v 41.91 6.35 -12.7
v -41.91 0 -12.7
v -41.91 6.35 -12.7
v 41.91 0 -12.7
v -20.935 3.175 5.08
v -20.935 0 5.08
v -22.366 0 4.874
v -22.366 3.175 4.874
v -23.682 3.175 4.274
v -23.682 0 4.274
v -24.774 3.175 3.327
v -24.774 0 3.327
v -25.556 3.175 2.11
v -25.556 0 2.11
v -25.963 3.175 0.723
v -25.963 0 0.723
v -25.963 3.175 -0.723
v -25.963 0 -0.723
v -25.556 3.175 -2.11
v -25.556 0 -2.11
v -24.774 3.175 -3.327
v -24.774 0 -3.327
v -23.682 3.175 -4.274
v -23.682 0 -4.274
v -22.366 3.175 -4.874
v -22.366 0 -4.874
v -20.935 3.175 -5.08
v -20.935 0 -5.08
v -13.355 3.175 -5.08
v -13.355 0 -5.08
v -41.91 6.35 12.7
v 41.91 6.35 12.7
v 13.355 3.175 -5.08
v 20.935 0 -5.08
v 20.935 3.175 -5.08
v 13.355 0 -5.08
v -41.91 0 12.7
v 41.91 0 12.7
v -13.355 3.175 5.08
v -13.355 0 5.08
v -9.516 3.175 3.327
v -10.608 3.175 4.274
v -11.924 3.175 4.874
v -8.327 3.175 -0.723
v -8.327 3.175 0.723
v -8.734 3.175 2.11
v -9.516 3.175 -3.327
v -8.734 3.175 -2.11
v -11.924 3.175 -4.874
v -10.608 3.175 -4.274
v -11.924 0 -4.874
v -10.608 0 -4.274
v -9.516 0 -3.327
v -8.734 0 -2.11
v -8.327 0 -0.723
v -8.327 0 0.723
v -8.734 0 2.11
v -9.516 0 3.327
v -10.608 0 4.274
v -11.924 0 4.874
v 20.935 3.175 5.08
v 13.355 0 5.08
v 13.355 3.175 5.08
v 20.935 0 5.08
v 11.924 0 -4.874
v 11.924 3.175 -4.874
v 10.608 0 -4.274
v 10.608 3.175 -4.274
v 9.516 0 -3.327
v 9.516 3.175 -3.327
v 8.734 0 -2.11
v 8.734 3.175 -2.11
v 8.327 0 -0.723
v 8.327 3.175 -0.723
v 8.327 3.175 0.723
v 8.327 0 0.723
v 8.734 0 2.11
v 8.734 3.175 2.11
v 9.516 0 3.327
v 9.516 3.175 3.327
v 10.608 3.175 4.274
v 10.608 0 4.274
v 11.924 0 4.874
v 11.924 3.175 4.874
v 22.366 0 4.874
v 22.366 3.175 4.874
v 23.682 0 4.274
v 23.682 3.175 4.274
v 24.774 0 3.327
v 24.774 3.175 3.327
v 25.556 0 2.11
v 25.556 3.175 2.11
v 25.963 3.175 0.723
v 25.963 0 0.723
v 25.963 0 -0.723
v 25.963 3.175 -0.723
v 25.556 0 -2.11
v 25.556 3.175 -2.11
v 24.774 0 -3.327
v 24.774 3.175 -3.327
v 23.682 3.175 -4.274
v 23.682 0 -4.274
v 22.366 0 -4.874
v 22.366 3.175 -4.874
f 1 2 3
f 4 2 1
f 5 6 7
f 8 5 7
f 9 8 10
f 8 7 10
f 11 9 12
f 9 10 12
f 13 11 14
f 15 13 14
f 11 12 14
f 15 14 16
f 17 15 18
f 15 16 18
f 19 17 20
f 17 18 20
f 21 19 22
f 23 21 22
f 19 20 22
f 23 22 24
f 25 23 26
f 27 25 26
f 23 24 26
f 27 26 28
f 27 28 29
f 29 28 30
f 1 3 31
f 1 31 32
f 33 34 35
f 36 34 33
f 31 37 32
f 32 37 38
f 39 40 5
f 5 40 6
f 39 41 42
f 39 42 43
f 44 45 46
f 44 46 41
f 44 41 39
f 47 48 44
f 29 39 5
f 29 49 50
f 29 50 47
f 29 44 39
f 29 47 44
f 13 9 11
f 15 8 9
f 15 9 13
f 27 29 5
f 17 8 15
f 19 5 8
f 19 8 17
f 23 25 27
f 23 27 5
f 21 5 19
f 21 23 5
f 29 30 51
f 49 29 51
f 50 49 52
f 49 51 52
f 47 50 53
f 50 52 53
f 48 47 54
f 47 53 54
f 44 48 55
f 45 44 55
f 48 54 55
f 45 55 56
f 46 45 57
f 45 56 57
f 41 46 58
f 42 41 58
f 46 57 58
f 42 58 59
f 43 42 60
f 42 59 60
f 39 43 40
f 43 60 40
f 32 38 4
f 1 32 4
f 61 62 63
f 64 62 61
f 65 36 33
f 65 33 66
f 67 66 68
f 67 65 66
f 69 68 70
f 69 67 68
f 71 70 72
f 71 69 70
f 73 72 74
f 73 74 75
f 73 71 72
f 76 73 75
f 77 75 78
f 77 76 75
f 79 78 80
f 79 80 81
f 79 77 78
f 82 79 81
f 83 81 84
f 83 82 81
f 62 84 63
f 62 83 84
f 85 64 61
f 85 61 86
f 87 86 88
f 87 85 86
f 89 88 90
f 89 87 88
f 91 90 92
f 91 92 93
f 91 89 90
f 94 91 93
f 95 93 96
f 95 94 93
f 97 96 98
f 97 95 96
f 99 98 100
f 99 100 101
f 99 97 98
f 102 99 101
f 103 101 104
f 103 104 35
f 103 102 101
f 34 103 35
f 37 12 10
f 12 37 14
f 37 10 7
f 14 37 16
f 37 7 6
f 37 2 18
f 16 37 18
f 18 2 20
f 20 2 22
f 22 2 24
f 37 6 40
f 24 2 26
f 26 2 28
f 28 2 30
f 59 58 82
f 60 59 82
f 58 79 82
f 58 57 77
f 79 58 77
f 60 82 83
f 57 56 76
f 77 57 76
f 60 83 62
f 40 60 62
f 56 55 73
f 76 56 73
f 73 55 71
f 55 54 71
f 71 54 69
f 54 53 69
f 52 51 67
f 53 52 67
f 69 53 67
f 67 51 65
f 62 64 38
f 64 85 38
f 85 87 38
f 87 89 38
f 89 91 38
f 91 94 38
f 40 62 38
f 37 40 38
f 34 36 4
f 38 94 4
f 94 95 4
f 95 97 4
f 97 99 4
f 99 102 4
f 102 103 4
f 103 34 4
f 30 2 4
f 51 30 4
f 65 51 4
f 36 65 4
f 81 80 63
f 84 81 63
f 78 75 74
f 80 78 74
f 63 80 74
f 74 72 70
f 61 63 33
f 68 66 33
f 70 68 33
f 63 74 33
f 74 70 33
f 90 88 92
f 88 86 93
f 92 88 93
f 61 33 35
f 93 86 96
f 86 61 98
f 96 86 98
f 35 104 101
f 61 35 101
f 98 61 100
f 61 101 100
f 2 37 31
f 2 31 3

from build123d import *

# Parameters (mm, degrees)
SKETCH1_W          = 83.82
SKETCH1_H          = 25.4
BOX_DEPTH          = 6.35
CUT_EXTRUDE1_DEPTH = 3.175


with BuildPart() as part:
    # Sketch1 → Box (new body)
    with BuildSketch(Plane(origin=(0, 0, 0), x_dir=(1, 0, 0), z_dir=(0, 1, 0))):
        Rectangle(SKETCH1_W, SKETCH1_H)
    extrude(amount=BOX_DEPTH)

    # Sketch5 → Cut-Extrude1 (cut)
    with BuildSketch(Plane(origin=(0, 0, 0), x_dir=(1, 0, 0), z_dir=(0, 1, 0))):
        with BuildLine():
            Line((-13.354872806, -5.08), (-20.935127194, -5.08))
            ThreePointArc((-20.935127194, -5.08), (-26.015127194, 0), (-20.935127194, 5.08))
            Line((-20.935127194, 5.08), (-13.354872806, 5.08))
            ThreePointArc((-13.354872806, 5.08), (-8.274872806, 0), (-13.354872806, -5.08))
        make_face()
        with BuildLine():
            Line((13.354872806, -5.08), (20.935127194, -5.08))
            ThreePointArc((20.935127194, -5.08), (26.015127194, 0), (20.935127194, 5.08))
            Line((20.935127194, 5.08), (13.354872806, 5.08))
            ThreePointArc((13.354872806, 5.08), (8.274872806, 0), (13.354872806, -5.08))
        make_face()
    extrude(amount=CUT_EXTRUDE1_DEPTH, mode=Mode.SUBTRACT)


solid = part.part
